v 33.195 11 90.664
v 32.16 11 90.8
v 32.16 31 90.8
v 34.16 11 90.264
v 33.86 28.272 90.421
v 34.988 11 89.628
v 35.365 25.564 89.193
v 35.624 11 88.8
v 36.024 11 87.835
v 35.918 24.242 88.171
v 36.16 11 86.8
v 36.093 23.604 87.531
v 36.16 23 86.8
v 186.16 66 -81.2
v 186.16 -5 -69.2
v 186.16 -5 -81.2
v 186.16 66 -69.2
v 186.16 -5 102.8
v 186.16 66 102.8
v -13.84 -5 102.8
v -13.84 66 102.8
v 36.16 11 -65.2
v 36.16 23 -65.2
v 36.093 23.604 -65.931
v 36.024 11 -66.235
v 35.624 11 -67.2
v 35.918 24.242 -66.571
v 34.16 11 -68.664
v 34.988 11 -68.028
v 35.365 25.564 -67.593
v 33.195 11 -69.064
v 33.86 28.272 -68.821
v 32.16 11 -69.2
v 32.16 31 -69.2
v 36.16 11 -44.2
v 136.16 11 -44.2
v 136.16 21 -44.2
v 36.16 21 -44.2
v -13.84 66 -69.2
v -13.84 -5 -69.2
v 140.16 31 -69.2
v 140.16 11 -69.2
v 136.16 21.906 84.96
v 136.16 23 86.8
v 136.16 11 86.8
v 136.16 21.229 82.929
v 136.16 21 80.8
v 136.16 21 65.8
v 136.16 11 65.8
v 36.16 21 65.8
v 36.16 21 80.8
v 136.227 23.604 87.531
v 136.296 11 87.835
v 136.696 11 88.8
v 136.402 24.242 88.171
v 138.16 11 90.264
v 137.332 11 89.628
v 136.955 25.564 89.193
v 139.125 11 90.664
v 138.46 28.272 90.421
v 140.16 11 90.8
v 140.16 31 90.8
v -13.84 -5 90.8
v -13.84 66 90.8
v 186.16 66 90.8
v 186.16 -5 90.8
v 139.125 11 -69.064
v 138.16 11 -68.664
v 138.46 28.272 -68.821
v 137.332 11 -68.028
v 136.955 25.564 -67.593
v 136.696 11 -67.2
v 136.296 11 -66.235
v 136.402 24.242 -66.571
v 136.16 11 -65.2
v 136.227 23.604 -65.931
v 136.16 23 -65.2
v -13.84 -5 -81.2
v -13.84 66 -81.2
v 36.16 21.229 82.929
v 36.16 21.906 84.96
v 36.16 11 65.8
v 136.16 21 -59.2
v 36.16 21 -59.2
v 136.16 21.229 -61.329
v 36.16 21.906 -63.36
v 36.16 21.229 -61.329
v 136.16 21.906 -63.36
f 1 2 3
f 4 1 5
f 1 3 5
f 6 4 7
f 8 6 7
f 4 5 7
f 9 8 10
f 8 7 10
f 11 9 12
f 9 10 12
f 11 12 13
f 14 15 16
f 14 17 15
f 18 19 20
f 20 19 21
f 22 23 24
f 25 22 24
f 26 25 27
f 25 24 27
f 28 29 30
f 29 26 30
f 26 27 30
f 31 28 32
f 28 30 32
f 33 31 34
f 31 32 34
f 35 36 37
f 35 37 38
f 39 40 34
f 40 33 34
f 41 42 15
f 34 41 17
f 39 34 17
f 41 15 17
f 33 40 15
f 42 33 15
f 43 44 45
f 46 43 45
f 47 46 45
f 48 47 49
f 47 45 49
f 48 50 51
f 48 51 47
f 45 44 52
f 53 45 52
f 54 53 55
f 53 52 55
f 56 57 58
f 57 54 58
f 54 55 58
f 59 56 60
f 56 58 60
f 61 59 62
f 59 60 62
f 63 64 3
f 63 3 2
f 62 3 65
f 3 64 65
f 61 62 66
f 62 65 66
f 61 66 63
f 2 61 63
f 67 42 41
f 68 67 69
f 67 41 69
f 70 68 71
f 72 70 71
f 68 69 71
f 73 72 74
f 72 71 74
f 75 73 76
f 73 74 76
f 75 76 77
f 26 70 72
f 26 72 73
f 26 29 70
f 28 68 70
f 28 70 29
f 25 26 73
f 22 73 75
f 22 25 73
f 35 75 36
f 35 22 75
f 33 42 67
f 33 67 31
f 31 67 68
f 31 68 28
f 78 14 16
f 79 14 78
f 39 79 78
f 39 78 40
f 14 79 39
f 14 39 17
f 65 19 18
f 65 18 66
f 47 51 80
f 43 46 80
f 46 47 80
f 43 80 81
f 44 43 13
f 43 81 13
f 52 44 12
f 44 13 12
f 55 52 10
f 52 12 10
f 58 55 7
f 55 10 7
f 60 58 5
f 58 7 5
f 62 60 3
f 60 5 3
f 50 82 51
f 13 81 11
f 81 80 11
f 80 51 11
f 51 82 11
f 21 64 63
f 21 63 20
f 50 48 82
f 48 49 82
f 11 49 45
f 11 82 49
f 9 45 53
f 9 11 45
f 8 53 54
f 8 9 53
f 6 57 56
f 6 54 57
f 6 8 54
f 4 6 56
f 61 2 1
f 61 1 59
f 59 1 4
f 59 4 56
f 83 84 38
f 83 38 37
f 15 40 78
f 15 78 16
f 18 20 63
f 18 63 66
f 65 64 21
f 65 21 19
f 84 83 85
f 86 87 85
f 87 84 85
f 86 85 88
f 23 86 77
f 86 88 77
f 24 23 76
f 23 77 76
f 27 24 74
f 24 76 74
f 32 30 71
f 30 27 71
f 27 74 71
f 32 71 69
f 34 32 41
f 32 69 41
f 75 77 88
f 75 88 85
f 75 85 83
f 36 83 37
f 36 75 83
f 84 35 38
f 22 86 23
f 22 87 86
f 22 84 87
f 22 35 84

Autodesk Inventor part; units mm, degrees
ref_plane "YZ Plane" through (0, 0, 0) normal (1, 0, 0) x (0, 1, 0)
ref_plane "XZ Plane" through (0, 0, 0) normal (0, 1, 0) x (-1, 0, 0)
ref_plane "XY Plane" through (0, 0, 0) normal (0, 0, 1) x (1, 0, 0)
sketch "Sketch1" plane through (0, 0, 0) normal (0, 1, 0) x (-1, 0, 0)
  line L0 (13.84, 90.8) -> (-186.16, 90.8)
  line L1 (-186.16, 90.8) -> (-186.16, -69.2)
  line L2 (-186.16, -69.2) -> (13.84, -69.2)
  line L3 (13.84, -69.2) -> (13.84, 90.8)
  point P0 (0, 0)
  dimension "d0" = 160
  dimension "d1" = 200
extrude "Extrusion1" add sketch "Sketch1" along normal blind 11
sketch "Sketch2" plane through (186.16, 0, 90.8) normal (1, 0, 0) x (0, 0, -1)
  line L0 (0, 0) -> (0, 11) projected
  line L1 (0, 0) -> (-12, 0)
  line L2 (-12, 0) -> (-12, 60)
  line L3 (-12, 60) -> (0, 60)
  line L4 (0, 60) -> (0, 0)
  line L5 (160, 0) -> (160, 11) projected
  line L6 (160, 0) -> (172, 0)
  line L7 (172, 0) -> (172, 60)
  line L8 (172, 60) -> (160, 60)
  line L9 (160, 60) -> (160, 0)
  point P0 (90.8, 0)
  point P1 (0, 11)
  dimension "d4" = 60
  dimension "d5" = 60
  dimension "d6" = 12
  dimension "d17" = 12
extrude "Extrusion2" add sketch "Sketch2" against normal up to surface (200 mm away)
sketch "Sketch3" plane through (0, 0, 0) normal (0, -1, 0) x (1, 0, 0)
  line L0 (186.16, 102.8) -> (186.16, -81.2) projected
  line L1 (186.16, 102.8) -> (-13.84, 102.8) projected
  line L2 (-13.84, -81.2) -> (-13.84, 102.8) projected
  line L3 (186.16, -81.2) -> (-13.84, -81.2) projected
  point P0 (0, 0)
extrude "Extrusion3" add sketch "Sketch3" along normal blind 5
sketch "Sketch7" plane through (0, 11, 0) normal (0, 1, 0) x (1, 0, 0)
  line L0 (186.16, -90.8) -> (-13.84, -90.8) projected
  line L1 (36.16, -90.8) -> (136.16, -90.8)
  line L2 (136.16, -90.8) -> (136.16, -65.8)
  line L3 (136.16, -65.8) -> (36.16, -65.8)
  line L4 (36.16, -65.8) -> (36.16, -90.8)
  line L5 (186.16, 69.2) -> (-13.84, 69.2) projected
  line L6 (36.16, 69.2) -> (136.16, 69.2)
  line L7 (136.16, 69.2) -> (136.16, 44.2)
  line L8 (136.16, 44.2) -> (36.16, 44.2)
  line L9 (36.16, 44.2) -> (36.16, 69.2)
  line L10 (-13.84, 69.2) -> (-13.84, -90.8) projected
  line L11 (186.16, -90.8) -> (186.16, 69.2) projected
  point P0 (0, 0)
  point P1 (136.16, 56.7)
  dimension "d18" = 25
  dimension "d19" = 25
  dimension "d20" = 50
  dimension "d21" = 50
  dimension "d22" = 50
  dimension "d23" = 50
extrude "Extrusion6" add sketch "Sketch7" along normal blind 10 contours L0 L4 L3 L2 | L7 L8 L9 L5
fillet "Fillet1" radius 4 4 edges at (36.16, 16, -69.2) (36.16, 16, 90.8) (136.16, 16, -69.2) (136.16, 16, 90.8)
fillet "Fillet2" radius 10 4 edges at (138.16, 21, -69.2) (34.16, 21, -69.2) (34.16, 21, 90.8) (138.16, 21, 90.8)
sketch "Sketch8" plane through (-13.84, 11, 90.8) normal (-1, 0, 0) x (0, 0, 1)
  line L0 (-160, 0) -> (0, 0)
  line L1 (0, 0) -> (0, -19)
  line L2 (0, -19) -> (-160, -19)
  line L3 (-160, -19) -> (-160, 0)
  line L4 (-172, 49) -> (12, 49)
  line L5 (12, 49) -> (12, -16)
  line L6 (12, -16) -> (-172, -16)
  line L7 (-172, -16) -> (-172, 49)
  point P0 (-90.8, -11)
  point P1 (-160, -16)
  point P2 (0, -16)
extrude "Extrusion7" cut sketch "Sketch8" against normal blind 1000 contours L0 L1 L6 L3
sketch "Sketch10" plane through (186.16, 60, 102.8) normal (0, 1, 0) x (1, 0, 0)
  line L0 (-200, 0) -> (-200, 12) projected
  line L1 (0, 0) -> (-200, 0) projected
  line L2 (0, 12) -> (0, 0) projected
  line L3 (0, 12) -> (-200, 12) projected
  line L4 (-200, 172) -> (-200, 184) projected
  line L5 (0, 172) -> (-200, 172) projected
  line L6 (0, 184) -> (0, 172) projected
  line L7 (0, 184) -> (-200, 184) projected
  point P0 (-186.16, 102.8)
extrude "Extrusion8" add sketch "Sketch10" along normal blind 6
properties part number "Y_karetka" material "Aluminum 6061"
